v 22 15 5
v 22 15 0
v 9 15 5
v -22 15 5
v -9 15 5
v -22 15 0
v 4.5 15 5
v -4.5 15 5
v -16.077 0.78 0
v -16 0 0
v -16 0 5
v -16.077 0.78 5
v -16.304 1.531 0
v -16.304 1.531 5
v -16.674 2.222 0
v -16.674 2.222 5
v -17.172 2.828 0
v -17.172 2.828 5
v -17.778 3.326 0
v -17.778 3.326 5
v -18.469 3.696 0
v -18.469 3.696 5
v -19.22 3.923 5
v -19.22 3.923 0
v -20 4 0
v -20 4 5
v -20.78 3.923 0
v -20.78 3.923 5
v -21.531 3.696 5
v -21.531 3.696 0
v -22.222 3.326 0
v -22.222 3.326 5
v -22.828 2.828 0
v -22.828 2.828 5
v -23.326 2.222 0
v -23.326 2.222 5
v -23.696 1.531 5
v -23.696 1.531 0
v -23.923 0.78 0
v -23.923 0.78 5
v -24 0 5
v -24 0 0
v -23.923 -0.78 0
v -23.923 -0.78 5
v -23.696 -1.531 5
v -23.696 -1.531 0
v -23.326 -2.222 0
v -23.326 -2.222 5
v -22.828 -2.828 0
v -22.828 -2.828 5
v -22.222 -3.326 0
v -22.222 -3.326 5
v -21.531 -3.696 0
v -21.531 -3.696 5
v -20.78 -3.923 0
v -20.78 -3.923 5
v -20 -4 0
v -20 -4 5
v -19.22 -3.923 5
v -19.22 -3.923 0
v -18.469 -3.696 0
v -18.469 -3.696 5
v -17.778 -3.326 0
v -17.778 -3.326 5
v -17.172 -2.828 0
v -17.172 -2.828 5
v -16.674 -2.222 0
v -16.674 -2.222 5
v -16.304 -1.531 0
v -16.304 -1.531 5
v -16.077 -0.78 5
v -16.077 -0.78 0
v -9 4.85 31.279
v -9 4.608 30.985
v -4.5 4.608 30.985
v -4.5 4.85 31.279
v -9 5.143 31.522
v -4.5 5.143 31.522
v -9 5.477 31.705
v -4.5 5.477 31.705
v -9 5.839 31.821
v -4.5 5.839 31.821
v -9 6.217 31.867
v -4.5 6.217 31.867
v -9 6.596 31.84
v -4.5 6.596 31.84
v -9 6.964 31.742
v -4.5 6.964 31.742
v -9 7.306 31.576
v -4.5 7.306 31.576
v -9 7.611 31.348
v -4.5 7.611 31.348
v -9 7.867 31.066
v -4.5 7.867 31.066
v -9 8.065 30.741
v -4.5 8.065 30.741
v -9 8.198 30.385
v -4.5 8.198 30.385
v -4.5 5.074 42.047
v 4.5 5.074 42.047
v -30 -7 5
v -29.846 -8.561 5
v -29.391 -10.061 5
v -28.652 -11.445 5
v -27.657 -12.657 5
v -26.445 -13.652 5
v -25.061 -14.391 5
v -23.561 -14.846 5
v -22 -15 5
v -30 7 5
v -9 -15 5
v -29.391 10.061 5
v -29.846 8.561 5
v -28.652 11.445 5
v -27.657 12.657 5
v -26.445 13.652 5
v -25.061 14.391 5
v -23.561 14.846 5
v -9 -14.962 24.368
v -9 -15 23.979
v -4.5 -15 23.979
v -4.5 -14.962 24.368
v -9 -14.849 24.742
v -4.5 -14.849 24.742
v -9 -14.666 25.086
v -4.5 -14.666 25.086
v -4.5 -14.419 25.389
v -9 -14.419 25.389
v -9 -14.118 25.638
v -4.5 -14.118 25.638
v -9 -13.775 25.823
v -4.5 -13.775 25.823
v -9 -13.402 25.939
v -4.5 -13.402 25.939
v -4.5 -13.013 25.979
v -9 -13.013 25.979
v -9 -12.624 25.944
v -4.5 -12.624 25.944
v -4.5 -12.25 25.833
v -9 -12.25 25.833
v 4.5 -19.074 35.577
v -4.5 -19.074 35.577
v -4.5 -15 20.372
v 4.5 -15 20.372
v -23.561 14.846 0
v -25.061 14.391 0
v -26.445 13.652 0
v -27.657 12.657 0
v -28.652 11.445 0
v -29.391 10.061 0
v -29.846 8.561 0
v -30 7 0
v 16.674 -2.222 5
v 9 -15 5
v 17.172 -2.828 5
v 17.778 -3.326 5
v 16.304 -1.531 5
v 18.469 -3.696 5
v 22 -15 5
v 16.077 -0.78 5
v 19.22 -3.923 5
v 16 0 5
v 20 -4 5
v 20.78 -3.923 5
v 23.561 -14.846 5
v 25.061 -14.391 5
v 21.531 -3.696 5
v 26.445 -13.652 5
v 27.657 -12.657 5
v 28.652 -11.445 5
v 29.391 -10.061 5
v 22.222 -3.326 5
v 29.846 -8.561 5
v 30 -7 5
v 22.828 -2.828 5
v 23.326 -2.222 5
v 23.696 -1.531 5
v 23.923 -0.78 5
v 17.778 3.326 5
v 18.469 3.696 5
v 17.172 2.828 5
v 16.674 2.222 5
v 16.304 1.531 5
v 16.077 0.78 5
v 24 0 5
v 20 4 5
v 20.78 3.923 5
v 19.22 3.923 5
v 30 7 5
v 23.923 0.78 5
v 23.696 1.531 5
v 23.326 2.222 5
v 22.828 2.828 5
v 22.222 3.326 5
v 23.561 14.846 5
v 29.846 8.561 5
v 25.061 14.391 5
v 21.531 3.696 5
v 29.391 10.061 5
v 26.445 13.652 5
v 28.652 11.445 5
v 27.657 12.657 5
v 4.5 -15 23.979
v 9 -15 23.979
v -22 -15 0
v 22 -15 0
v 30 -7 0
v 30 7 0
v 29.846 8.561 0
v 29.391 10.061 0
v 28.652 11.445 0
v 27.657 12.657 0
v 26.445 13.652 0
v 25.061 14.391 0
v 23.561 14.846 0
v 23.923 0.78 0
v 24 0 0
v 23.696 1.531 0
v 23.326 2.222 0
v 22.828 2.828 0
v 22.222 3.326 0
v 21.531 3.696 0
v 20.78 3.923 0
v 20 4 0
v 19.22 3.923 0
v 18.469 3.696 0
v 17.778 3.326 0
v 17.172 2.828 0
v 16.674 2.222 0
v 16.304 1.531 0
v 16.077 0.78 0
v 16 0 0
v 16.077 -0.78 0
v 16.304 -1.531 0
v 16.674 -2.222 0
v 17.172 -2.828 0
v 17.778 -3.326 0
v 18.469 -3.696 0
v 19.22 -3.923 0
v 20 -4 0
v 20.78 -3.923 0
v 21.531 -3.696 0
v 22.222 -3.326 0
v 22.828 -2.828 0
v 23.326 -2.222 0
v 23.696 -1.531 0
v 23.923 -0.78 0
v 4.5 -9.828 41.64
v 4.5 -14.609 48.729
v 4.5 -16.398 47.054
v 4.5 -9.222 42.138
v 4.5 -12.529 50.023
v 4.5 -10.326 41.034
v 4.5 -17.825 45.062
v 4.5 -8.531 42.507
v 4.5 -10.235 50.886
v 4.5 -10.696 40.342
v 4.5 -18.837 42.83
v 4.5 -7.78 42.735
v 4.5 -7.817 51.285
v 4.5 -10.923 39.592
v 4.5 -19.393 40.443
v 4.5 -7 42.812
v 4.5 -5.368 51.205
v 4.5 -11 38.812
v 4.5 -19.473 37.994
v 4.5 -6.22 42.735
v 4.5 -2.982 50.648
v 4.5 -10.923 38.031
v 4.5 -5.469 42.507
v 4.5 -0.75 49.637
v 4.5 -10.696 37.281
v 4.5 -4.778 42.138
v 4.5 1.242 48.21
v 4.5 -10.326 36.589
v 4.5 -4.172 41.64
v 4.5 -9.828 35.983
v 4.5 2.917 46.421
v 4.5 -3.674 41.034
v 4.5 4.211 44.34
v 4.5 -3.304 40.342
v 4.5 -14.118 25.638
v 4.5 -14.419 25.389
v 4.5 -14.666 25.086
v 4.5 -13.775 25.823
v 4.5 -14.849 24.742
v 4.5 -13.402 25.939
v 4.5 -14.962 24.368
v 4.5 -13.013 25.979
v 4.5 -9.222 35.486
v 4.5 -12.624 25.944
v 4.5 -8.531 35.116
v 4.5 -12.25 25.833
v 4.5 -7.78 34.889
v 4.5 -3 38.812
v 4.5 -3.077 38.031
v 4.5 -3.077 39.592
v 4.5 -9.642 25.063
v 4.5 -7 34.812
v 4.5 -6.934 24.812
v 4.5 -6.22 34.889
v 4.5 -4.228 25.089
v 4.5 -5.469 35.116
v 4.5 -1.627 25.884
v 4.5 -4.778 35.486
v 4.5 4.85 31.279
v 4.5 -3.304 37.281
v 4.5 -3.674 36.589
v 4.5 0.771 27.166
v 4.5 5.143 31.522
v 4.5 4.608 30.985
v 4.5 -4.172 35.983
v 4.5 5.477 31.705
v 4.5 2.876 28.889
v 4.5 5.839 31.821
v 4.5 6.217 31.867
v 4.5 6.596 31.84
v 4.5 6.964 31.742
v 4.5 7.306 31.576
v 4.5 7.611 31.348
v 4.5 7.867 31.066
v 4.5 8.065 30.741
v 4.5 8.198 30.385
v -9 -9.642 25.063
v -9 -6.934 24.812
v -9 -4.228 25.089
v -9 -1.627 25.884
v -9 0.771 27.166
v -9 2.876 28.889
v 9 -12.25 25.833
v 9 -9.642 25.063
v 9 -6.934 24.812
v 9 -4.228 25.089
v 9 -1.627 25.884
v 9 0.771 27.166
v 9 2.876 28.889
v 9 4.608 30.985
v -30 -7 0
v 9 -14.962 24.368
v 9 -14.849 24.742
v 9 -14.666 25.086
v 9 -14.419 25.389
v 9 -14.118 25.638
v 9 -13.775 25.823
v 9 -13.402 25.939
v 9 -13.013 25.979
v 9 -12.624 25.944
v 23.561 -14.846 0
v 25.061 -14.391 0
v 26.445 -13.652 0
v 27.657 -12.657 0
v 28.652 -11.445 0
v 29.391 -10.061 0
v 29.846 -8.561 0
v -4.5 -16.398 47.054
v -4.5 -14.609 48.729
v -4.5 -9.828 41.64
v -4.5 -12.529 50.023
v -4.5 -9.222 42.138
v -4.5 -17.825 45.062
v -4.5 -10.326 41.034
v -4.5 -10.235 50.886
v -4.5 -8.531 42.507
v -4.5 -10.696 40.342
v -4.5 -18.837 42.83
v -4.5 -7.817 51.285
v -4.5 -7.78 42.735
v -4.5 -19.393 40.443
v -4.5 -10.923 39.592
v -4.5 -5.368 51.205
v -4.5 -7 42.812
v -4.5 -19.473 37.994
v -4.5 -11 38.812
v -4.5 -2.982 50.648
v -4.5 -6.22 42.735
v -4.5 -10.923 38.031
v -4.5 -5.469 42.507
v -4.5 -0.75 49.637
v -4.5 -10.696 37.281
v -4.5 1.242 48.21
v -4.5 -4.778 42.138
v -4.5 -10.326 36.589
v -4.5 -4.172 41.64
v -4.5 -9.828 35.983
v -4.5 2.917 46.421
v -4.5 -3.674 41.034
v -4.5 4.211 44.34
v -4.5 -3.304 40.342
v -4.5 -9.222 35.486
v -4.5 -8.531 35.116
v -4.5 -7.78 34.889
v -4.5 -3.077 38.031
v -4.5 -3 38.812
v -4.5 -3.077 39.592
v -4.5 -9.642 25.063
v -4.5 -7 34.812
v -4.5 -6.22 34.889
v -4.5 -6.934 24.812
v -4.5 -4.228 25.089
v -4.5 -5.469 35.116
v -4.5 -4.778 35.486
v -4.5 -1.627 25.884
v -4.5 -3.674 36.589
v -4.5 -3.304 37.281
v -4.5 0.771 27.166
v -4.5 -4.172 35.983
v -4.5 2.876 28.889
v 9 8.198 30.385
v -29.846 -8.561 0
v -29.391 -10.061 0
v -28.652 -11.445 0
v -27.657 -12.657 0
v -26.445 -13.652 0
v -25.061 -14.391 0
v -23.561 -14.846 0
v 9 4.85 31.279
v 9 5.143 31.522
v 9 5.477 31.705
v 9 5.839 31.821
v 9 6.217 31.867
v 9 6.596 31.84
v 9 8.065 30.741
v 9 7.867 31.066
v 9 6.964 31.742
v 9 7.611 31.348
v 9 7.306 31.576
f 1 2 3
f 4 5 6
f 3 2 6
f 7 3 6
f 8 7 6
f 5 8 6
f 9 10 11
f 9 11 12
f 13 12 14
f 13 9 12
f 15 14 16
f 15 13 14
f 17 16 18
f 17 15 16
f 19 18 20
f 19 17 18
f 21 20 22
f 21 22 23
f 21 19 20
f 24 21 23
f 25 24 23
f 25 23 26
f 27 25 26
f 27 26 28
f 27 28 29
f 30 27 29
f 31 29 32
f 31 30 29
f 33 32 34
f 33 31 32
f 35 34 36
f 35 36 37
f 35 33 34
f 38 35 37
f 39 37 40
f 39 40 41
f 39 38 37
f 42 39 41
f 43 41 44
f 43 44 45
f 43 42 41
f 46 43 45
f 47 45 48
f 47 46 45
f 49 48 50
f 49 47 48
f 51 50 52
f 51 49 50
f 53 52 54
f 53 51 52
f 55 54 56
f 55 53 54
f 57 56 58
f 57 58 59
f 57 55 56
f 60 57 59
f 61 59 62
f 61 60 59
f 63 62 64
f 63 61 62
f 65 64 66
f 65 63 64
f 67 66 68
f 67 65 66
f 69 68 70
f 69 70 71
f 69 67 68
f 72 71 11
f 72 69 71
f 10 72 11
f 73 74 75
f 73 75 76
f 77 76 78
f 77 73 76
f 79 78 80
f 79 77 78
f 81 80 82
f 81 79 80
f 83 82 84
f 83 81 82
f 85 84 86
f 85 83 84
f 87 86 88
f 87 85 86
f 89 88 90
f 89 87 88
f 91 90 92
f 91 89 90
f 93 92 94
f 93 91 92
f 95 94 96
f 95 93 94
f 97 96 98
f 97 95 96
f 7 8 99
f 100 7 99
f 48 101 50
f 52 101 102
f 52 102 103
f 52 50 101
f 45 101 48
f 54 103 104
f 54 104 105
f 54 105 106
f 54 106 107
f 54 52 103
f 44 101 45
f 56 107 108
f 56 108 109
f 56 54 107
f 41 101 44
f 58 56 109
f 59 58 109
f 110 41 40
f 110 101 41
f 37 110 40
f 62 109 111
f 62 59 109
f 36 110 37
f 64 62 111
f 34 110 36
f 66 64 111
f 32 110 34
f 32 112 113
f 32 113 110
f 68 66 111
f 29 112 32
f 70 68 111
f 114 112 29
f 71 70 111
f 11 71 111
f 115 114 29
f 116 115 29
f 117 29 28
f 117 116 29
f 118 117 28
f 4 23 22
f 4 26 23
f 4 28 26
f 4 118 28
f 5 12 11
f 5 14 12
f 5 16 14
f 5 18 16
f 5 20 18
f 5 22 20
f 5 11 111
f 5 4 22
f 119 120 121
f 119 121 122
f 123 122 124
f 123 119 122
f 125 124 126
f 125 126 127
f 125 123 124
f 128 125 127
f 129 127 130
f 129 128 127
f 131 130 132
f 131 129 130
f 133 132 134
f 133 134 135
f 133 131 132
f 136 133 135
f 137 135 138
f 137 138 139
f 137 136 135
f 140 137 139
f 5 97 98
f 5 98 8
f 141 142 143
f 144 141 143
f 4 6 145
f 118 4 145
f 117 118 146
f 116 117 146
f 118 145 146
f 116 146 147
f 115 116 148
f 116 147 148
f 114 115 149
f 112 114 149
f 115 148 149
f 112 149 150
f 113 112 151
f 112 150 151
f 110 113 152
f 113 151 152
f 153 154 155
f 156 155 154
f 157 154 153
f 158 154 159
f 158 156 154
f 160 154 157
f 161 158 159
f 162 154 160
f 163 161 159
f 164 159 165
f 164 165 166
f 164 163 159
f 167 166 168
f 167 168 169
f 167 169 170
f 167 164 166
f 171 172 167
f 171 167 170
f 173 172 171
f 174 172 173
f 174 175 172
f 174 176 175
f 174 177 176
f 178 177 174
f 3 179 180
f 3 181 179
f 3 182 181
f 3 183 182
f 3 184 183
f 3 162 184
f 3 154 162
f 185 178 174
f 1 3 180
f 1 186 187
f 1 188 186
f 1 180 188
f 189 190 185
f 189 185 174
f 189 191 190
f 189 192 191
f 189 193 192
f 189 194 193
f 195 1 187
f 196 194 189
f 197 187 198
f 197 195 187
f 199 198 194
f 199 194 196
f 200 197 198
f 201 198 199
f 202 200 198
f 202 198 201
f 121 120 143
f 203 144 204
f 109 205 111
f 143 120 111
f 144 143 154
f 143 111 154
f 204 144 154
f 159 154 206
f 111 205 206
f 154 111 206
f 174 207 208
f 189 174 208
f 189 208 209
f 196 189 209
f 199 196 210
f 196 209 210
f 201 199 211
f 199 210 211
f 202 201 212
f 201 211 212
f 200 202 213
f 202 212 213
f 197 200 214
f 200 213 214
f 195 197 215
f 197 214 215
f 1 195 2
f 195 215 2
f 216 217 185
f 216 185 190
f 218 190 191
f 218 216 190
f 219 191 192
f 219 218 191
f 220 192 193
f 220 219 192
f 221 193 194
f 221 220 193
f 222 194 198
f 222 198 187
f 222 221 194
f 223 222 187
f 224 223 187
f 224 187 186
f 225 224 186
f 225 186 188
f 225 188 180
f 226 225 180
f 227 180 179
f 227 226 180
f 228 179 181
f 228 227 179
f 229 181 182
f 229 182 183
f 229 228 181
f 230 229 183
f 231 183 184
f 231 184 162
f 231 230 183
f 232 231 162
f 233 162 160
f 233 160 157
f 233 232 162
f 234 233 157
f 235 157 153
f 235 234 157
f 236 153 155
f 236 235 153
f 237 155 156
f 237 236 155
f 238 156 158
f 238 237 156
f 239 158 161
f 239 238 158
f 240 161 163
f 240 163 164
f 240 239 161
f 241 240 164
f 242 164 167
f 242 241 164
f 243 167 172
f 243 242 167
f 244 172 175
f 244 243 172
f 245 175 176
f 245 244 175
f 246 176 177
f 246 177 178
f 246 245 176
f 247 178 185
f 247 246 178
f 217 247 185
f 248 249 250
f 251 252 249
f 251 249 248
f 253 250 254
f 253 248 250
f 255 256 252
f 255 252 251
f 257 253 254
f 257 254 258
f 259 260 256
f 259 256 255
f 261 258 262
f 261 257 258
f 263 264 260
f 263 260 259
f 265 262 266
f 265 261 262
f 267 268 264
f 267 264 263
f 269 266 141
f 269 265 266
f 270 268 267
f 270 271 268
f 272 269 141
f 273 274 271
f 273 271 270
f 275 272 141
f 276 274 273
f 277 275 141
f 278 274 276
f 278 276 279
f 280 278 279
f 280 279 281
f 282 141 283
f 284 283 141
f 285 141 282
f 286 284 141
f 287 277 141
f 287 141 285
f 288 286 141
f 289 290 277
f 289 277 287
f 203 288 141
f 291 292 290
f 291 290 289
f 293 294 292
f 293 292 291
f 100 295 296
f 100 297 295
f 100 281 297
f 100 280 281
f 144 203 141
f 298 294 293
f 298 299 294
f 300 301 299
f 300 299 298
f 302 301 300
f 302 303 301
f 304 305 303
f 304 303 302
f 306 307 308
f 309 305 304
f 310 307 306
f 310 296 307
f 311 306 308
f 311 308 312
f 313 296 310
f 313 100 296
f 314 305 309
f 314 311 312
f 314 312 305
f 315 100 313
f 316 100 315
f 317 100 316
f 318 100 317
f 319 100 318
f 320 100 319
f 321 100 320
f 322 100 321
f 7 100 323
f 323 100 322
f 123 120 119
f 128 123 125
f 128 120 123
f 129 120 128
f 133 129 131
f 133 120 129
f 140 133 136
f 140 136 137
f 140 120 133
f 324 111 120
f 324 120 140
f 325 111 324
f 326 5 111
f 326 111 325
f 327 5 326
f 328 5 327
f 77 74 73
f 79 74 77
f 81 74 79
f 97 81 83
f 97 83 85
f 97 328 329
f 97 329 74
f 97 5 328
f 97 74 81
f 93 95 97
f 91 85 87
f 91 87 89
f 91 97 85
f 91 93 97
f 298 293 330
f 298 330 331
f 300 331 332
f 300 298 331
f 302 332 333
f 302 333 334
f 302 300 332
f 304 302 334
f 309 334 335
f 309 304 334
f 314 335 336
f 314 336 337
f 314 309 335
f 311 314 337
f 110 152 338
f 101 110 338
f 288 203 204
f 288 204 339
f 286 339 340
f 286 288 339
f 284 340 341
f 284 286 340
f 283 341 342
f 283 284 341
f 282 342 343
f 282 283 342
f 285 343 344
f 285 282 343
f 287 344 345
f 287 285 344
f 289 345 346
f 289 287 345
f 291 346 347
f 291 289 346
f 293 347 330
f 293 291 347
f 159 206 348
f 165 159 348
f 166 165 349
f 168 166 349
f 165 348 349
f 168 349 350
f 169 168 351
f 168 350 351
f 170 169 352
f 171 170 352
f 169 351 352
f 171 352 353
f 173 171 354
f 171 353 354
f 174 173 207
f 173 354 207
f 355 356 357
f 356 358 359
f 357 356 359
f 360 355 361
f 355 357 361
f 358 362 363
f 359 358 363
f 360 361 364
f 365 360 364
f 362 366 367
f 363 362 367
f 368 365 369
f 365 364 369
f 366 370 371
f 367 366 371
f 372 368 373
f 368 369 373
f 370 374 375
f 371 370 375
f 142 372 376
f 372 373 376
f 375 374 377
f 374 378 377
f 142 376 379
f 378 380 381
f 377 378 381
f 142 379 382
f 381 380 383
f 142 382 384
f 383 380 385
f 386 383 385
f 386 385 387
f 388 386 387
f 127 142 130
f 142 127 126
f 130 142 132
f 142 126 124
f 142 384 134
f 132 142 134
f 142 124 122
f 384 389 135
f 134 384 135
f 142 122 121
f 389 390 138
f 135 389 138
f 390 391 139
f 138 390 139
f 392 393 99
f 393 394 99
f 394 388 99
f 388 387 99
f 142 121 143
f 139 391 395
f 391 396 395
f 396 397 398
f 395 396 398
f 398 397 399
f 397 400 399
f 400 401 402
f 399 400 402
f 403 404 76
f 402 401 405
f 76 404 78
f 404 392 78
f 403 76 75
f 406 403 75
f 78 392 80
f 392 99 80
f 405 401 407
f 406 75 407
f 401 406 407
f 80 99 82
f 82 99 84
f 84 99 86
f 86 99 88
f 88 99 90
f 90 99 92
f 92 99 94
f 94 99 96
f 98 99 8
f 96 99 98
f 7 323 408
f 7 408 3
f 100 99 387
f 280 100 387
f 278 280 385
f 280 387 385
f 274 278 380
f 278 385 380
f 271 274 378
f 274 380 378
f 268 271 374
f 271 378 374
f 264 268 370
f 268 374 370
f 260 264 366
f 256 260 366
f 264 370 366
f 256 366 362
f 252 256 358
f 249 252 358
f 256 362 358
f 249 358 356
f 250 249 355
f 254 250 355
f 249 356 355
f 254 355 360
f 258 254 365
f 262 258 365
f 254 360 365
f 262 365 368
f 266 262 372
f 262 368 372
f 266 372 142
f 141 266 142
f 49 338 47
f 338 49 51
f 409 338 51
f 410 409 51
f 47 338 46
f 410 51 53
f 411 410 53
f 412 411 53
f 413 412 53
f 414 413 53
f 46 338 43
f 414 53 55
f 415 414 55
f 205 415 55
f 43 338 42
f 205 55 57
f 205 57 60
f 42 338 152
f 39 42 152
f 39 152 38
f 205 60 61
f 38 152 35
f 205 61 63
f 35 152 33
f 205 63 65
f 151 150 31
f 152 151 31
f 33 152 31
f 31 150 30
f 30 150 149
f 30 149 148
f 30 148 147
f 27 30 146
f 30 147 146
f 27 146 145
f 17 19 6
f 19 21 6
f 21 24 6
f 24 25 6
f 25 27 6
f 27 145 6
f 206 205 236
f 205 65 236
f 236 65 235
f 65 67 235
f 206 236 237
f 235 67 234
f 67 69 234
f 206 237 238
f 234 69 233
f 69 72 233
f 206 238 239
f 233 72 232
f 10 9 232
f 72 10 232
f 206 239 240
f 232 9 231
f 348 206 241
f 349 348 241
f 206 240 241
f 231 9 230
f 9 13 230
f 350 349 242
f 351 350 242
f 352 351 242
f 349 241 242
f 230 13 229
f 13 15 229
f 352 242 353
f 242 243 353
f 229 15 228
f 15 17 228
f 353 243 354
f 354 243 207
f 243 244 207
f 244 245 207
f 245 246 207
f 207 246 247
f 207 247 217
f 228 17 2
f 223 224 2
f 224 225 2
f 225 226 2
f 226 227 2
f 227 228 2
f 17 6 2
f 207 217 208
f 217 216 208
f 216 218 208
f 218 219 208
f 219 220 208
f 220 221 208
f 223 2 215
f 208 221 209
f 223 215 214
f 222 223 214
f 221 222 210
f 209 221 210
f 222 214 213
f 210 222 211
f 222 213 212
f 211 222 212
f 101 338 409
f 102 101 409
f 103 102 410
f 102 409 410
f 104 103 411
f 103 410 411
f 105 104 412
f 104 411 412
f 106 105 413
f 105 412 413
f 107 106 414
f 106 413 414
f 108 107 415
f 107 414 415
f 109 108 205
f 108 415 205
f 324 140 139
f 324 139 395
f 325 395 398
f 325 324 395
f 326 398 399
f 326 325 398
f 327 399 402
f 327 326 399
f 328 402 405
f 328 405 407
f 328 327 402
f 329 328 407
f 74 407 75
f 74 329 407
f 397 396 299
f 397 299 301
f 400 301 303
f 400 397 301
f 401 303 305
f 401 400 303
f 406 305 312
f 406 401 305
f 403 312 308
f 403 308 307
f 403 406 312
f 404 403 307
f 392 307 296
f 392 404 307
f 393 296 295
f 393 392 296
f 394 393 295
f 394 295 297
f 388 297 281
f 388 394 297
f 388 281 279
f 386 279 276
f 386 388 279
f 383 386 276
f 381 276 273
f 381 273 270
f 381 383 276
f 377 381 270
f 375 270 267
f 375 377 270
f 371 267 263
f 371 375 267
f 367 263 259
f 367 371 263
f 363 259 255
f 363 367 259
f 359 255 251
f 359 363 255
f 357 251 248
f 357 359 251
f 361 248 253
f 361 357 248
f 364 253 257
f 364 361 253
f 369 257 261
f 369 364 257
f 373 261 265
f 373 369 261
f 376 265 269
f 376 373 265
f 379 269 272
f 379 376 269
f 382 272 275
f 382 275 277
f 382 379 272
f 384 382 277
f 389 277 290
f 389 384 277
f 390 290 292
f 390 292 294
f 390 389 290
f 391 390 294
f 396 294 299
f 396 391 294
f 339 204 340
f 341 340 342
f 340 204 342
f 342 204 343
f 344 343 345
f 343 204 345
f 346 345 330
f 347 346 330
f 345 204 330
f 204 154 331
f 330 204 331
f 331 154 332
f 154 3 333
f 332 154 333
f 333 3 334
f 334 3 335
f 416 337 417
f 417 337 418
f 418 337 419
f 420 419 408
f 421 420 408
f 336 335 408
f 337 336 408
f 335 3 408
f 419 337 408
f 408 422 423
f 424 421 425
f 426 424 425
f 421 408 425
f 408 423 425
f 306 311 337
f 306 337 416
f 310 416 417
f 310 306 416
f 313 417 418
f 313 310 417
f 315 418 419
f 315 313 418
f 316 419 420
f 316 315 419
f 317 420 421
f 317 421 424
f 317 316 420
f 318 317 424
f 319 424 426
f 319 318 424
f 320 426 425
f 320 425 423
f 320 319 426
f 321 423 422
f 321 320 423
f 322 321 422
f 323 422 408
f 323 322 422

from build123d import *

# Parameters (mm, degrees)
SKETCH1_R                = 4
BOSS_EXTRUDE1_DEPTH      = 5
BOSS_EXTRUDE2_DEPTH      = 9
BOSS_EXTRUDE2_DEPTH_BACK = 9
BOSS_EXTRUDE3_DEPTH      = 4.5
BOSS_EXTRUDE3_DEPTH_BACK = 4.5
SKETCH3_3_R              = 4


with BuildPart() as part:
    # Sketch1 → Boss-Extrude1 (new body)
    with BuildSketch(Plane.XY):
        with BuildLine():
            ThreePointArc((-30, -7), (-27.656854249, -12.656854249), (-22, -15))
            Line((-22, -15), (22, -15))
            ThreePointArc((22, -15), (27.656854249, -12.656854249), (30, -7))
            Line((30, -7), (30, 7))
            ThreePointArc((30, 7), (27.656854249, 12.656854249), (22, 15))
            Line((22, 15), (-22, 15))
            ThreePointArc((-22, 15), (-27.656854249, 12.656854249), (-30, 7))
            Line((-30, 7), (-30, -7))
        make_face()
        with Locations((-20, 0)):
            Circle(SKETCH1_R, mode=Mode.SUBTRACT)
        with Locations((20, 0)):
            Circle(SKETCH1_R, mode=Mode.SUBTRACT)
    extrude(amount=BOSS_EXTRUDE1_DEPTH)

    # Sketch3 → Boss-Extrude2 (add, two sides: drawn at the far end of the back side and taken through both)
    with BuildSketch(Plane(origin=(0, 0, 0), x_dir=(0, 0, -1), z_dir=(1, 0, 0)).offset(-BOSS_EXTRUDE2_DEPTH_BACK)):
        with BuildLine():
            Line((-5, -15), (-5, 15))
            Line((-5, 15), (-30.384833832, 8.198154275))
            ThreePointArc((-30.384833832, 8.198154275), (-31.839798327, 6.596210245), (-30.985266169, 4.608014794))
            ThreePointArc((-30.985266169, 4.608014794), (-25.423013471, -2.908363546), (-25.833411807, -12.25))
            ThreePointArc((-25.833411807, -12.25), (-25.637674581, -14.118033989), (-23.979362186, -15))
            Line((-23.979362186, -15), (-20.371874306, -15))
            Line((-20.371874306, -15), (-5, -15))
        make_face()
    extrude(amount=BOSS_EXTRUDE2_DEPTH + BOSS_EXTRUDE2_DEPTH_BACK)

    # Sketch3<3> → Boss-Extrude3 (add, two sides: drawn at the far end of the back side and taken through both)
    with BuildSketch(Plane(origin=(0, 0, 0), x_dir=(0, 0, -1), z_dir=(1, 0, 0)).offset(-BOSS_EXTRUDE3_DEPTH_BACK)):
        with BuildLine():
            Line((-30.384833832, 8.198154275), (-5, 15))
            Line((-5, 15), (-42.04675827, 5.074136854))
            ThreePointArc((-42.04675827, 5.074136854), (-50.885864002, -10.235118587), (-35.576521096, -19.074072829))
            Line((-35.576521096, -19.074072829), (-20.371874306, -15))
            Line((-20.371874306, -15), (-23.979362186, -15))
            ThreePointArc((-23.979362186, -15), (-25.637674581, -14.118033989), (-25.833411807, -12.25))
            ThreePointArc((-25.833411807, -12.25), (-25.423013471, -2.908363546), (-30.985266169, 4.608014794))
            ThreePointArc((-30.985266169, 4.608014794), (-31.839798327, 6.596210245), (-30.384833832, 8.198154275))
        make_face()
        with Locations((-38.81175916, -7)):
            Circle(SKETCH3_3_R, mode=Mode.SUBTRACT)
    extrude(amount=BOSS_EXTRUDE3_DEPTH + BOSS_EXTRUDE3_DEPTH_BACK)


solid = part.part
